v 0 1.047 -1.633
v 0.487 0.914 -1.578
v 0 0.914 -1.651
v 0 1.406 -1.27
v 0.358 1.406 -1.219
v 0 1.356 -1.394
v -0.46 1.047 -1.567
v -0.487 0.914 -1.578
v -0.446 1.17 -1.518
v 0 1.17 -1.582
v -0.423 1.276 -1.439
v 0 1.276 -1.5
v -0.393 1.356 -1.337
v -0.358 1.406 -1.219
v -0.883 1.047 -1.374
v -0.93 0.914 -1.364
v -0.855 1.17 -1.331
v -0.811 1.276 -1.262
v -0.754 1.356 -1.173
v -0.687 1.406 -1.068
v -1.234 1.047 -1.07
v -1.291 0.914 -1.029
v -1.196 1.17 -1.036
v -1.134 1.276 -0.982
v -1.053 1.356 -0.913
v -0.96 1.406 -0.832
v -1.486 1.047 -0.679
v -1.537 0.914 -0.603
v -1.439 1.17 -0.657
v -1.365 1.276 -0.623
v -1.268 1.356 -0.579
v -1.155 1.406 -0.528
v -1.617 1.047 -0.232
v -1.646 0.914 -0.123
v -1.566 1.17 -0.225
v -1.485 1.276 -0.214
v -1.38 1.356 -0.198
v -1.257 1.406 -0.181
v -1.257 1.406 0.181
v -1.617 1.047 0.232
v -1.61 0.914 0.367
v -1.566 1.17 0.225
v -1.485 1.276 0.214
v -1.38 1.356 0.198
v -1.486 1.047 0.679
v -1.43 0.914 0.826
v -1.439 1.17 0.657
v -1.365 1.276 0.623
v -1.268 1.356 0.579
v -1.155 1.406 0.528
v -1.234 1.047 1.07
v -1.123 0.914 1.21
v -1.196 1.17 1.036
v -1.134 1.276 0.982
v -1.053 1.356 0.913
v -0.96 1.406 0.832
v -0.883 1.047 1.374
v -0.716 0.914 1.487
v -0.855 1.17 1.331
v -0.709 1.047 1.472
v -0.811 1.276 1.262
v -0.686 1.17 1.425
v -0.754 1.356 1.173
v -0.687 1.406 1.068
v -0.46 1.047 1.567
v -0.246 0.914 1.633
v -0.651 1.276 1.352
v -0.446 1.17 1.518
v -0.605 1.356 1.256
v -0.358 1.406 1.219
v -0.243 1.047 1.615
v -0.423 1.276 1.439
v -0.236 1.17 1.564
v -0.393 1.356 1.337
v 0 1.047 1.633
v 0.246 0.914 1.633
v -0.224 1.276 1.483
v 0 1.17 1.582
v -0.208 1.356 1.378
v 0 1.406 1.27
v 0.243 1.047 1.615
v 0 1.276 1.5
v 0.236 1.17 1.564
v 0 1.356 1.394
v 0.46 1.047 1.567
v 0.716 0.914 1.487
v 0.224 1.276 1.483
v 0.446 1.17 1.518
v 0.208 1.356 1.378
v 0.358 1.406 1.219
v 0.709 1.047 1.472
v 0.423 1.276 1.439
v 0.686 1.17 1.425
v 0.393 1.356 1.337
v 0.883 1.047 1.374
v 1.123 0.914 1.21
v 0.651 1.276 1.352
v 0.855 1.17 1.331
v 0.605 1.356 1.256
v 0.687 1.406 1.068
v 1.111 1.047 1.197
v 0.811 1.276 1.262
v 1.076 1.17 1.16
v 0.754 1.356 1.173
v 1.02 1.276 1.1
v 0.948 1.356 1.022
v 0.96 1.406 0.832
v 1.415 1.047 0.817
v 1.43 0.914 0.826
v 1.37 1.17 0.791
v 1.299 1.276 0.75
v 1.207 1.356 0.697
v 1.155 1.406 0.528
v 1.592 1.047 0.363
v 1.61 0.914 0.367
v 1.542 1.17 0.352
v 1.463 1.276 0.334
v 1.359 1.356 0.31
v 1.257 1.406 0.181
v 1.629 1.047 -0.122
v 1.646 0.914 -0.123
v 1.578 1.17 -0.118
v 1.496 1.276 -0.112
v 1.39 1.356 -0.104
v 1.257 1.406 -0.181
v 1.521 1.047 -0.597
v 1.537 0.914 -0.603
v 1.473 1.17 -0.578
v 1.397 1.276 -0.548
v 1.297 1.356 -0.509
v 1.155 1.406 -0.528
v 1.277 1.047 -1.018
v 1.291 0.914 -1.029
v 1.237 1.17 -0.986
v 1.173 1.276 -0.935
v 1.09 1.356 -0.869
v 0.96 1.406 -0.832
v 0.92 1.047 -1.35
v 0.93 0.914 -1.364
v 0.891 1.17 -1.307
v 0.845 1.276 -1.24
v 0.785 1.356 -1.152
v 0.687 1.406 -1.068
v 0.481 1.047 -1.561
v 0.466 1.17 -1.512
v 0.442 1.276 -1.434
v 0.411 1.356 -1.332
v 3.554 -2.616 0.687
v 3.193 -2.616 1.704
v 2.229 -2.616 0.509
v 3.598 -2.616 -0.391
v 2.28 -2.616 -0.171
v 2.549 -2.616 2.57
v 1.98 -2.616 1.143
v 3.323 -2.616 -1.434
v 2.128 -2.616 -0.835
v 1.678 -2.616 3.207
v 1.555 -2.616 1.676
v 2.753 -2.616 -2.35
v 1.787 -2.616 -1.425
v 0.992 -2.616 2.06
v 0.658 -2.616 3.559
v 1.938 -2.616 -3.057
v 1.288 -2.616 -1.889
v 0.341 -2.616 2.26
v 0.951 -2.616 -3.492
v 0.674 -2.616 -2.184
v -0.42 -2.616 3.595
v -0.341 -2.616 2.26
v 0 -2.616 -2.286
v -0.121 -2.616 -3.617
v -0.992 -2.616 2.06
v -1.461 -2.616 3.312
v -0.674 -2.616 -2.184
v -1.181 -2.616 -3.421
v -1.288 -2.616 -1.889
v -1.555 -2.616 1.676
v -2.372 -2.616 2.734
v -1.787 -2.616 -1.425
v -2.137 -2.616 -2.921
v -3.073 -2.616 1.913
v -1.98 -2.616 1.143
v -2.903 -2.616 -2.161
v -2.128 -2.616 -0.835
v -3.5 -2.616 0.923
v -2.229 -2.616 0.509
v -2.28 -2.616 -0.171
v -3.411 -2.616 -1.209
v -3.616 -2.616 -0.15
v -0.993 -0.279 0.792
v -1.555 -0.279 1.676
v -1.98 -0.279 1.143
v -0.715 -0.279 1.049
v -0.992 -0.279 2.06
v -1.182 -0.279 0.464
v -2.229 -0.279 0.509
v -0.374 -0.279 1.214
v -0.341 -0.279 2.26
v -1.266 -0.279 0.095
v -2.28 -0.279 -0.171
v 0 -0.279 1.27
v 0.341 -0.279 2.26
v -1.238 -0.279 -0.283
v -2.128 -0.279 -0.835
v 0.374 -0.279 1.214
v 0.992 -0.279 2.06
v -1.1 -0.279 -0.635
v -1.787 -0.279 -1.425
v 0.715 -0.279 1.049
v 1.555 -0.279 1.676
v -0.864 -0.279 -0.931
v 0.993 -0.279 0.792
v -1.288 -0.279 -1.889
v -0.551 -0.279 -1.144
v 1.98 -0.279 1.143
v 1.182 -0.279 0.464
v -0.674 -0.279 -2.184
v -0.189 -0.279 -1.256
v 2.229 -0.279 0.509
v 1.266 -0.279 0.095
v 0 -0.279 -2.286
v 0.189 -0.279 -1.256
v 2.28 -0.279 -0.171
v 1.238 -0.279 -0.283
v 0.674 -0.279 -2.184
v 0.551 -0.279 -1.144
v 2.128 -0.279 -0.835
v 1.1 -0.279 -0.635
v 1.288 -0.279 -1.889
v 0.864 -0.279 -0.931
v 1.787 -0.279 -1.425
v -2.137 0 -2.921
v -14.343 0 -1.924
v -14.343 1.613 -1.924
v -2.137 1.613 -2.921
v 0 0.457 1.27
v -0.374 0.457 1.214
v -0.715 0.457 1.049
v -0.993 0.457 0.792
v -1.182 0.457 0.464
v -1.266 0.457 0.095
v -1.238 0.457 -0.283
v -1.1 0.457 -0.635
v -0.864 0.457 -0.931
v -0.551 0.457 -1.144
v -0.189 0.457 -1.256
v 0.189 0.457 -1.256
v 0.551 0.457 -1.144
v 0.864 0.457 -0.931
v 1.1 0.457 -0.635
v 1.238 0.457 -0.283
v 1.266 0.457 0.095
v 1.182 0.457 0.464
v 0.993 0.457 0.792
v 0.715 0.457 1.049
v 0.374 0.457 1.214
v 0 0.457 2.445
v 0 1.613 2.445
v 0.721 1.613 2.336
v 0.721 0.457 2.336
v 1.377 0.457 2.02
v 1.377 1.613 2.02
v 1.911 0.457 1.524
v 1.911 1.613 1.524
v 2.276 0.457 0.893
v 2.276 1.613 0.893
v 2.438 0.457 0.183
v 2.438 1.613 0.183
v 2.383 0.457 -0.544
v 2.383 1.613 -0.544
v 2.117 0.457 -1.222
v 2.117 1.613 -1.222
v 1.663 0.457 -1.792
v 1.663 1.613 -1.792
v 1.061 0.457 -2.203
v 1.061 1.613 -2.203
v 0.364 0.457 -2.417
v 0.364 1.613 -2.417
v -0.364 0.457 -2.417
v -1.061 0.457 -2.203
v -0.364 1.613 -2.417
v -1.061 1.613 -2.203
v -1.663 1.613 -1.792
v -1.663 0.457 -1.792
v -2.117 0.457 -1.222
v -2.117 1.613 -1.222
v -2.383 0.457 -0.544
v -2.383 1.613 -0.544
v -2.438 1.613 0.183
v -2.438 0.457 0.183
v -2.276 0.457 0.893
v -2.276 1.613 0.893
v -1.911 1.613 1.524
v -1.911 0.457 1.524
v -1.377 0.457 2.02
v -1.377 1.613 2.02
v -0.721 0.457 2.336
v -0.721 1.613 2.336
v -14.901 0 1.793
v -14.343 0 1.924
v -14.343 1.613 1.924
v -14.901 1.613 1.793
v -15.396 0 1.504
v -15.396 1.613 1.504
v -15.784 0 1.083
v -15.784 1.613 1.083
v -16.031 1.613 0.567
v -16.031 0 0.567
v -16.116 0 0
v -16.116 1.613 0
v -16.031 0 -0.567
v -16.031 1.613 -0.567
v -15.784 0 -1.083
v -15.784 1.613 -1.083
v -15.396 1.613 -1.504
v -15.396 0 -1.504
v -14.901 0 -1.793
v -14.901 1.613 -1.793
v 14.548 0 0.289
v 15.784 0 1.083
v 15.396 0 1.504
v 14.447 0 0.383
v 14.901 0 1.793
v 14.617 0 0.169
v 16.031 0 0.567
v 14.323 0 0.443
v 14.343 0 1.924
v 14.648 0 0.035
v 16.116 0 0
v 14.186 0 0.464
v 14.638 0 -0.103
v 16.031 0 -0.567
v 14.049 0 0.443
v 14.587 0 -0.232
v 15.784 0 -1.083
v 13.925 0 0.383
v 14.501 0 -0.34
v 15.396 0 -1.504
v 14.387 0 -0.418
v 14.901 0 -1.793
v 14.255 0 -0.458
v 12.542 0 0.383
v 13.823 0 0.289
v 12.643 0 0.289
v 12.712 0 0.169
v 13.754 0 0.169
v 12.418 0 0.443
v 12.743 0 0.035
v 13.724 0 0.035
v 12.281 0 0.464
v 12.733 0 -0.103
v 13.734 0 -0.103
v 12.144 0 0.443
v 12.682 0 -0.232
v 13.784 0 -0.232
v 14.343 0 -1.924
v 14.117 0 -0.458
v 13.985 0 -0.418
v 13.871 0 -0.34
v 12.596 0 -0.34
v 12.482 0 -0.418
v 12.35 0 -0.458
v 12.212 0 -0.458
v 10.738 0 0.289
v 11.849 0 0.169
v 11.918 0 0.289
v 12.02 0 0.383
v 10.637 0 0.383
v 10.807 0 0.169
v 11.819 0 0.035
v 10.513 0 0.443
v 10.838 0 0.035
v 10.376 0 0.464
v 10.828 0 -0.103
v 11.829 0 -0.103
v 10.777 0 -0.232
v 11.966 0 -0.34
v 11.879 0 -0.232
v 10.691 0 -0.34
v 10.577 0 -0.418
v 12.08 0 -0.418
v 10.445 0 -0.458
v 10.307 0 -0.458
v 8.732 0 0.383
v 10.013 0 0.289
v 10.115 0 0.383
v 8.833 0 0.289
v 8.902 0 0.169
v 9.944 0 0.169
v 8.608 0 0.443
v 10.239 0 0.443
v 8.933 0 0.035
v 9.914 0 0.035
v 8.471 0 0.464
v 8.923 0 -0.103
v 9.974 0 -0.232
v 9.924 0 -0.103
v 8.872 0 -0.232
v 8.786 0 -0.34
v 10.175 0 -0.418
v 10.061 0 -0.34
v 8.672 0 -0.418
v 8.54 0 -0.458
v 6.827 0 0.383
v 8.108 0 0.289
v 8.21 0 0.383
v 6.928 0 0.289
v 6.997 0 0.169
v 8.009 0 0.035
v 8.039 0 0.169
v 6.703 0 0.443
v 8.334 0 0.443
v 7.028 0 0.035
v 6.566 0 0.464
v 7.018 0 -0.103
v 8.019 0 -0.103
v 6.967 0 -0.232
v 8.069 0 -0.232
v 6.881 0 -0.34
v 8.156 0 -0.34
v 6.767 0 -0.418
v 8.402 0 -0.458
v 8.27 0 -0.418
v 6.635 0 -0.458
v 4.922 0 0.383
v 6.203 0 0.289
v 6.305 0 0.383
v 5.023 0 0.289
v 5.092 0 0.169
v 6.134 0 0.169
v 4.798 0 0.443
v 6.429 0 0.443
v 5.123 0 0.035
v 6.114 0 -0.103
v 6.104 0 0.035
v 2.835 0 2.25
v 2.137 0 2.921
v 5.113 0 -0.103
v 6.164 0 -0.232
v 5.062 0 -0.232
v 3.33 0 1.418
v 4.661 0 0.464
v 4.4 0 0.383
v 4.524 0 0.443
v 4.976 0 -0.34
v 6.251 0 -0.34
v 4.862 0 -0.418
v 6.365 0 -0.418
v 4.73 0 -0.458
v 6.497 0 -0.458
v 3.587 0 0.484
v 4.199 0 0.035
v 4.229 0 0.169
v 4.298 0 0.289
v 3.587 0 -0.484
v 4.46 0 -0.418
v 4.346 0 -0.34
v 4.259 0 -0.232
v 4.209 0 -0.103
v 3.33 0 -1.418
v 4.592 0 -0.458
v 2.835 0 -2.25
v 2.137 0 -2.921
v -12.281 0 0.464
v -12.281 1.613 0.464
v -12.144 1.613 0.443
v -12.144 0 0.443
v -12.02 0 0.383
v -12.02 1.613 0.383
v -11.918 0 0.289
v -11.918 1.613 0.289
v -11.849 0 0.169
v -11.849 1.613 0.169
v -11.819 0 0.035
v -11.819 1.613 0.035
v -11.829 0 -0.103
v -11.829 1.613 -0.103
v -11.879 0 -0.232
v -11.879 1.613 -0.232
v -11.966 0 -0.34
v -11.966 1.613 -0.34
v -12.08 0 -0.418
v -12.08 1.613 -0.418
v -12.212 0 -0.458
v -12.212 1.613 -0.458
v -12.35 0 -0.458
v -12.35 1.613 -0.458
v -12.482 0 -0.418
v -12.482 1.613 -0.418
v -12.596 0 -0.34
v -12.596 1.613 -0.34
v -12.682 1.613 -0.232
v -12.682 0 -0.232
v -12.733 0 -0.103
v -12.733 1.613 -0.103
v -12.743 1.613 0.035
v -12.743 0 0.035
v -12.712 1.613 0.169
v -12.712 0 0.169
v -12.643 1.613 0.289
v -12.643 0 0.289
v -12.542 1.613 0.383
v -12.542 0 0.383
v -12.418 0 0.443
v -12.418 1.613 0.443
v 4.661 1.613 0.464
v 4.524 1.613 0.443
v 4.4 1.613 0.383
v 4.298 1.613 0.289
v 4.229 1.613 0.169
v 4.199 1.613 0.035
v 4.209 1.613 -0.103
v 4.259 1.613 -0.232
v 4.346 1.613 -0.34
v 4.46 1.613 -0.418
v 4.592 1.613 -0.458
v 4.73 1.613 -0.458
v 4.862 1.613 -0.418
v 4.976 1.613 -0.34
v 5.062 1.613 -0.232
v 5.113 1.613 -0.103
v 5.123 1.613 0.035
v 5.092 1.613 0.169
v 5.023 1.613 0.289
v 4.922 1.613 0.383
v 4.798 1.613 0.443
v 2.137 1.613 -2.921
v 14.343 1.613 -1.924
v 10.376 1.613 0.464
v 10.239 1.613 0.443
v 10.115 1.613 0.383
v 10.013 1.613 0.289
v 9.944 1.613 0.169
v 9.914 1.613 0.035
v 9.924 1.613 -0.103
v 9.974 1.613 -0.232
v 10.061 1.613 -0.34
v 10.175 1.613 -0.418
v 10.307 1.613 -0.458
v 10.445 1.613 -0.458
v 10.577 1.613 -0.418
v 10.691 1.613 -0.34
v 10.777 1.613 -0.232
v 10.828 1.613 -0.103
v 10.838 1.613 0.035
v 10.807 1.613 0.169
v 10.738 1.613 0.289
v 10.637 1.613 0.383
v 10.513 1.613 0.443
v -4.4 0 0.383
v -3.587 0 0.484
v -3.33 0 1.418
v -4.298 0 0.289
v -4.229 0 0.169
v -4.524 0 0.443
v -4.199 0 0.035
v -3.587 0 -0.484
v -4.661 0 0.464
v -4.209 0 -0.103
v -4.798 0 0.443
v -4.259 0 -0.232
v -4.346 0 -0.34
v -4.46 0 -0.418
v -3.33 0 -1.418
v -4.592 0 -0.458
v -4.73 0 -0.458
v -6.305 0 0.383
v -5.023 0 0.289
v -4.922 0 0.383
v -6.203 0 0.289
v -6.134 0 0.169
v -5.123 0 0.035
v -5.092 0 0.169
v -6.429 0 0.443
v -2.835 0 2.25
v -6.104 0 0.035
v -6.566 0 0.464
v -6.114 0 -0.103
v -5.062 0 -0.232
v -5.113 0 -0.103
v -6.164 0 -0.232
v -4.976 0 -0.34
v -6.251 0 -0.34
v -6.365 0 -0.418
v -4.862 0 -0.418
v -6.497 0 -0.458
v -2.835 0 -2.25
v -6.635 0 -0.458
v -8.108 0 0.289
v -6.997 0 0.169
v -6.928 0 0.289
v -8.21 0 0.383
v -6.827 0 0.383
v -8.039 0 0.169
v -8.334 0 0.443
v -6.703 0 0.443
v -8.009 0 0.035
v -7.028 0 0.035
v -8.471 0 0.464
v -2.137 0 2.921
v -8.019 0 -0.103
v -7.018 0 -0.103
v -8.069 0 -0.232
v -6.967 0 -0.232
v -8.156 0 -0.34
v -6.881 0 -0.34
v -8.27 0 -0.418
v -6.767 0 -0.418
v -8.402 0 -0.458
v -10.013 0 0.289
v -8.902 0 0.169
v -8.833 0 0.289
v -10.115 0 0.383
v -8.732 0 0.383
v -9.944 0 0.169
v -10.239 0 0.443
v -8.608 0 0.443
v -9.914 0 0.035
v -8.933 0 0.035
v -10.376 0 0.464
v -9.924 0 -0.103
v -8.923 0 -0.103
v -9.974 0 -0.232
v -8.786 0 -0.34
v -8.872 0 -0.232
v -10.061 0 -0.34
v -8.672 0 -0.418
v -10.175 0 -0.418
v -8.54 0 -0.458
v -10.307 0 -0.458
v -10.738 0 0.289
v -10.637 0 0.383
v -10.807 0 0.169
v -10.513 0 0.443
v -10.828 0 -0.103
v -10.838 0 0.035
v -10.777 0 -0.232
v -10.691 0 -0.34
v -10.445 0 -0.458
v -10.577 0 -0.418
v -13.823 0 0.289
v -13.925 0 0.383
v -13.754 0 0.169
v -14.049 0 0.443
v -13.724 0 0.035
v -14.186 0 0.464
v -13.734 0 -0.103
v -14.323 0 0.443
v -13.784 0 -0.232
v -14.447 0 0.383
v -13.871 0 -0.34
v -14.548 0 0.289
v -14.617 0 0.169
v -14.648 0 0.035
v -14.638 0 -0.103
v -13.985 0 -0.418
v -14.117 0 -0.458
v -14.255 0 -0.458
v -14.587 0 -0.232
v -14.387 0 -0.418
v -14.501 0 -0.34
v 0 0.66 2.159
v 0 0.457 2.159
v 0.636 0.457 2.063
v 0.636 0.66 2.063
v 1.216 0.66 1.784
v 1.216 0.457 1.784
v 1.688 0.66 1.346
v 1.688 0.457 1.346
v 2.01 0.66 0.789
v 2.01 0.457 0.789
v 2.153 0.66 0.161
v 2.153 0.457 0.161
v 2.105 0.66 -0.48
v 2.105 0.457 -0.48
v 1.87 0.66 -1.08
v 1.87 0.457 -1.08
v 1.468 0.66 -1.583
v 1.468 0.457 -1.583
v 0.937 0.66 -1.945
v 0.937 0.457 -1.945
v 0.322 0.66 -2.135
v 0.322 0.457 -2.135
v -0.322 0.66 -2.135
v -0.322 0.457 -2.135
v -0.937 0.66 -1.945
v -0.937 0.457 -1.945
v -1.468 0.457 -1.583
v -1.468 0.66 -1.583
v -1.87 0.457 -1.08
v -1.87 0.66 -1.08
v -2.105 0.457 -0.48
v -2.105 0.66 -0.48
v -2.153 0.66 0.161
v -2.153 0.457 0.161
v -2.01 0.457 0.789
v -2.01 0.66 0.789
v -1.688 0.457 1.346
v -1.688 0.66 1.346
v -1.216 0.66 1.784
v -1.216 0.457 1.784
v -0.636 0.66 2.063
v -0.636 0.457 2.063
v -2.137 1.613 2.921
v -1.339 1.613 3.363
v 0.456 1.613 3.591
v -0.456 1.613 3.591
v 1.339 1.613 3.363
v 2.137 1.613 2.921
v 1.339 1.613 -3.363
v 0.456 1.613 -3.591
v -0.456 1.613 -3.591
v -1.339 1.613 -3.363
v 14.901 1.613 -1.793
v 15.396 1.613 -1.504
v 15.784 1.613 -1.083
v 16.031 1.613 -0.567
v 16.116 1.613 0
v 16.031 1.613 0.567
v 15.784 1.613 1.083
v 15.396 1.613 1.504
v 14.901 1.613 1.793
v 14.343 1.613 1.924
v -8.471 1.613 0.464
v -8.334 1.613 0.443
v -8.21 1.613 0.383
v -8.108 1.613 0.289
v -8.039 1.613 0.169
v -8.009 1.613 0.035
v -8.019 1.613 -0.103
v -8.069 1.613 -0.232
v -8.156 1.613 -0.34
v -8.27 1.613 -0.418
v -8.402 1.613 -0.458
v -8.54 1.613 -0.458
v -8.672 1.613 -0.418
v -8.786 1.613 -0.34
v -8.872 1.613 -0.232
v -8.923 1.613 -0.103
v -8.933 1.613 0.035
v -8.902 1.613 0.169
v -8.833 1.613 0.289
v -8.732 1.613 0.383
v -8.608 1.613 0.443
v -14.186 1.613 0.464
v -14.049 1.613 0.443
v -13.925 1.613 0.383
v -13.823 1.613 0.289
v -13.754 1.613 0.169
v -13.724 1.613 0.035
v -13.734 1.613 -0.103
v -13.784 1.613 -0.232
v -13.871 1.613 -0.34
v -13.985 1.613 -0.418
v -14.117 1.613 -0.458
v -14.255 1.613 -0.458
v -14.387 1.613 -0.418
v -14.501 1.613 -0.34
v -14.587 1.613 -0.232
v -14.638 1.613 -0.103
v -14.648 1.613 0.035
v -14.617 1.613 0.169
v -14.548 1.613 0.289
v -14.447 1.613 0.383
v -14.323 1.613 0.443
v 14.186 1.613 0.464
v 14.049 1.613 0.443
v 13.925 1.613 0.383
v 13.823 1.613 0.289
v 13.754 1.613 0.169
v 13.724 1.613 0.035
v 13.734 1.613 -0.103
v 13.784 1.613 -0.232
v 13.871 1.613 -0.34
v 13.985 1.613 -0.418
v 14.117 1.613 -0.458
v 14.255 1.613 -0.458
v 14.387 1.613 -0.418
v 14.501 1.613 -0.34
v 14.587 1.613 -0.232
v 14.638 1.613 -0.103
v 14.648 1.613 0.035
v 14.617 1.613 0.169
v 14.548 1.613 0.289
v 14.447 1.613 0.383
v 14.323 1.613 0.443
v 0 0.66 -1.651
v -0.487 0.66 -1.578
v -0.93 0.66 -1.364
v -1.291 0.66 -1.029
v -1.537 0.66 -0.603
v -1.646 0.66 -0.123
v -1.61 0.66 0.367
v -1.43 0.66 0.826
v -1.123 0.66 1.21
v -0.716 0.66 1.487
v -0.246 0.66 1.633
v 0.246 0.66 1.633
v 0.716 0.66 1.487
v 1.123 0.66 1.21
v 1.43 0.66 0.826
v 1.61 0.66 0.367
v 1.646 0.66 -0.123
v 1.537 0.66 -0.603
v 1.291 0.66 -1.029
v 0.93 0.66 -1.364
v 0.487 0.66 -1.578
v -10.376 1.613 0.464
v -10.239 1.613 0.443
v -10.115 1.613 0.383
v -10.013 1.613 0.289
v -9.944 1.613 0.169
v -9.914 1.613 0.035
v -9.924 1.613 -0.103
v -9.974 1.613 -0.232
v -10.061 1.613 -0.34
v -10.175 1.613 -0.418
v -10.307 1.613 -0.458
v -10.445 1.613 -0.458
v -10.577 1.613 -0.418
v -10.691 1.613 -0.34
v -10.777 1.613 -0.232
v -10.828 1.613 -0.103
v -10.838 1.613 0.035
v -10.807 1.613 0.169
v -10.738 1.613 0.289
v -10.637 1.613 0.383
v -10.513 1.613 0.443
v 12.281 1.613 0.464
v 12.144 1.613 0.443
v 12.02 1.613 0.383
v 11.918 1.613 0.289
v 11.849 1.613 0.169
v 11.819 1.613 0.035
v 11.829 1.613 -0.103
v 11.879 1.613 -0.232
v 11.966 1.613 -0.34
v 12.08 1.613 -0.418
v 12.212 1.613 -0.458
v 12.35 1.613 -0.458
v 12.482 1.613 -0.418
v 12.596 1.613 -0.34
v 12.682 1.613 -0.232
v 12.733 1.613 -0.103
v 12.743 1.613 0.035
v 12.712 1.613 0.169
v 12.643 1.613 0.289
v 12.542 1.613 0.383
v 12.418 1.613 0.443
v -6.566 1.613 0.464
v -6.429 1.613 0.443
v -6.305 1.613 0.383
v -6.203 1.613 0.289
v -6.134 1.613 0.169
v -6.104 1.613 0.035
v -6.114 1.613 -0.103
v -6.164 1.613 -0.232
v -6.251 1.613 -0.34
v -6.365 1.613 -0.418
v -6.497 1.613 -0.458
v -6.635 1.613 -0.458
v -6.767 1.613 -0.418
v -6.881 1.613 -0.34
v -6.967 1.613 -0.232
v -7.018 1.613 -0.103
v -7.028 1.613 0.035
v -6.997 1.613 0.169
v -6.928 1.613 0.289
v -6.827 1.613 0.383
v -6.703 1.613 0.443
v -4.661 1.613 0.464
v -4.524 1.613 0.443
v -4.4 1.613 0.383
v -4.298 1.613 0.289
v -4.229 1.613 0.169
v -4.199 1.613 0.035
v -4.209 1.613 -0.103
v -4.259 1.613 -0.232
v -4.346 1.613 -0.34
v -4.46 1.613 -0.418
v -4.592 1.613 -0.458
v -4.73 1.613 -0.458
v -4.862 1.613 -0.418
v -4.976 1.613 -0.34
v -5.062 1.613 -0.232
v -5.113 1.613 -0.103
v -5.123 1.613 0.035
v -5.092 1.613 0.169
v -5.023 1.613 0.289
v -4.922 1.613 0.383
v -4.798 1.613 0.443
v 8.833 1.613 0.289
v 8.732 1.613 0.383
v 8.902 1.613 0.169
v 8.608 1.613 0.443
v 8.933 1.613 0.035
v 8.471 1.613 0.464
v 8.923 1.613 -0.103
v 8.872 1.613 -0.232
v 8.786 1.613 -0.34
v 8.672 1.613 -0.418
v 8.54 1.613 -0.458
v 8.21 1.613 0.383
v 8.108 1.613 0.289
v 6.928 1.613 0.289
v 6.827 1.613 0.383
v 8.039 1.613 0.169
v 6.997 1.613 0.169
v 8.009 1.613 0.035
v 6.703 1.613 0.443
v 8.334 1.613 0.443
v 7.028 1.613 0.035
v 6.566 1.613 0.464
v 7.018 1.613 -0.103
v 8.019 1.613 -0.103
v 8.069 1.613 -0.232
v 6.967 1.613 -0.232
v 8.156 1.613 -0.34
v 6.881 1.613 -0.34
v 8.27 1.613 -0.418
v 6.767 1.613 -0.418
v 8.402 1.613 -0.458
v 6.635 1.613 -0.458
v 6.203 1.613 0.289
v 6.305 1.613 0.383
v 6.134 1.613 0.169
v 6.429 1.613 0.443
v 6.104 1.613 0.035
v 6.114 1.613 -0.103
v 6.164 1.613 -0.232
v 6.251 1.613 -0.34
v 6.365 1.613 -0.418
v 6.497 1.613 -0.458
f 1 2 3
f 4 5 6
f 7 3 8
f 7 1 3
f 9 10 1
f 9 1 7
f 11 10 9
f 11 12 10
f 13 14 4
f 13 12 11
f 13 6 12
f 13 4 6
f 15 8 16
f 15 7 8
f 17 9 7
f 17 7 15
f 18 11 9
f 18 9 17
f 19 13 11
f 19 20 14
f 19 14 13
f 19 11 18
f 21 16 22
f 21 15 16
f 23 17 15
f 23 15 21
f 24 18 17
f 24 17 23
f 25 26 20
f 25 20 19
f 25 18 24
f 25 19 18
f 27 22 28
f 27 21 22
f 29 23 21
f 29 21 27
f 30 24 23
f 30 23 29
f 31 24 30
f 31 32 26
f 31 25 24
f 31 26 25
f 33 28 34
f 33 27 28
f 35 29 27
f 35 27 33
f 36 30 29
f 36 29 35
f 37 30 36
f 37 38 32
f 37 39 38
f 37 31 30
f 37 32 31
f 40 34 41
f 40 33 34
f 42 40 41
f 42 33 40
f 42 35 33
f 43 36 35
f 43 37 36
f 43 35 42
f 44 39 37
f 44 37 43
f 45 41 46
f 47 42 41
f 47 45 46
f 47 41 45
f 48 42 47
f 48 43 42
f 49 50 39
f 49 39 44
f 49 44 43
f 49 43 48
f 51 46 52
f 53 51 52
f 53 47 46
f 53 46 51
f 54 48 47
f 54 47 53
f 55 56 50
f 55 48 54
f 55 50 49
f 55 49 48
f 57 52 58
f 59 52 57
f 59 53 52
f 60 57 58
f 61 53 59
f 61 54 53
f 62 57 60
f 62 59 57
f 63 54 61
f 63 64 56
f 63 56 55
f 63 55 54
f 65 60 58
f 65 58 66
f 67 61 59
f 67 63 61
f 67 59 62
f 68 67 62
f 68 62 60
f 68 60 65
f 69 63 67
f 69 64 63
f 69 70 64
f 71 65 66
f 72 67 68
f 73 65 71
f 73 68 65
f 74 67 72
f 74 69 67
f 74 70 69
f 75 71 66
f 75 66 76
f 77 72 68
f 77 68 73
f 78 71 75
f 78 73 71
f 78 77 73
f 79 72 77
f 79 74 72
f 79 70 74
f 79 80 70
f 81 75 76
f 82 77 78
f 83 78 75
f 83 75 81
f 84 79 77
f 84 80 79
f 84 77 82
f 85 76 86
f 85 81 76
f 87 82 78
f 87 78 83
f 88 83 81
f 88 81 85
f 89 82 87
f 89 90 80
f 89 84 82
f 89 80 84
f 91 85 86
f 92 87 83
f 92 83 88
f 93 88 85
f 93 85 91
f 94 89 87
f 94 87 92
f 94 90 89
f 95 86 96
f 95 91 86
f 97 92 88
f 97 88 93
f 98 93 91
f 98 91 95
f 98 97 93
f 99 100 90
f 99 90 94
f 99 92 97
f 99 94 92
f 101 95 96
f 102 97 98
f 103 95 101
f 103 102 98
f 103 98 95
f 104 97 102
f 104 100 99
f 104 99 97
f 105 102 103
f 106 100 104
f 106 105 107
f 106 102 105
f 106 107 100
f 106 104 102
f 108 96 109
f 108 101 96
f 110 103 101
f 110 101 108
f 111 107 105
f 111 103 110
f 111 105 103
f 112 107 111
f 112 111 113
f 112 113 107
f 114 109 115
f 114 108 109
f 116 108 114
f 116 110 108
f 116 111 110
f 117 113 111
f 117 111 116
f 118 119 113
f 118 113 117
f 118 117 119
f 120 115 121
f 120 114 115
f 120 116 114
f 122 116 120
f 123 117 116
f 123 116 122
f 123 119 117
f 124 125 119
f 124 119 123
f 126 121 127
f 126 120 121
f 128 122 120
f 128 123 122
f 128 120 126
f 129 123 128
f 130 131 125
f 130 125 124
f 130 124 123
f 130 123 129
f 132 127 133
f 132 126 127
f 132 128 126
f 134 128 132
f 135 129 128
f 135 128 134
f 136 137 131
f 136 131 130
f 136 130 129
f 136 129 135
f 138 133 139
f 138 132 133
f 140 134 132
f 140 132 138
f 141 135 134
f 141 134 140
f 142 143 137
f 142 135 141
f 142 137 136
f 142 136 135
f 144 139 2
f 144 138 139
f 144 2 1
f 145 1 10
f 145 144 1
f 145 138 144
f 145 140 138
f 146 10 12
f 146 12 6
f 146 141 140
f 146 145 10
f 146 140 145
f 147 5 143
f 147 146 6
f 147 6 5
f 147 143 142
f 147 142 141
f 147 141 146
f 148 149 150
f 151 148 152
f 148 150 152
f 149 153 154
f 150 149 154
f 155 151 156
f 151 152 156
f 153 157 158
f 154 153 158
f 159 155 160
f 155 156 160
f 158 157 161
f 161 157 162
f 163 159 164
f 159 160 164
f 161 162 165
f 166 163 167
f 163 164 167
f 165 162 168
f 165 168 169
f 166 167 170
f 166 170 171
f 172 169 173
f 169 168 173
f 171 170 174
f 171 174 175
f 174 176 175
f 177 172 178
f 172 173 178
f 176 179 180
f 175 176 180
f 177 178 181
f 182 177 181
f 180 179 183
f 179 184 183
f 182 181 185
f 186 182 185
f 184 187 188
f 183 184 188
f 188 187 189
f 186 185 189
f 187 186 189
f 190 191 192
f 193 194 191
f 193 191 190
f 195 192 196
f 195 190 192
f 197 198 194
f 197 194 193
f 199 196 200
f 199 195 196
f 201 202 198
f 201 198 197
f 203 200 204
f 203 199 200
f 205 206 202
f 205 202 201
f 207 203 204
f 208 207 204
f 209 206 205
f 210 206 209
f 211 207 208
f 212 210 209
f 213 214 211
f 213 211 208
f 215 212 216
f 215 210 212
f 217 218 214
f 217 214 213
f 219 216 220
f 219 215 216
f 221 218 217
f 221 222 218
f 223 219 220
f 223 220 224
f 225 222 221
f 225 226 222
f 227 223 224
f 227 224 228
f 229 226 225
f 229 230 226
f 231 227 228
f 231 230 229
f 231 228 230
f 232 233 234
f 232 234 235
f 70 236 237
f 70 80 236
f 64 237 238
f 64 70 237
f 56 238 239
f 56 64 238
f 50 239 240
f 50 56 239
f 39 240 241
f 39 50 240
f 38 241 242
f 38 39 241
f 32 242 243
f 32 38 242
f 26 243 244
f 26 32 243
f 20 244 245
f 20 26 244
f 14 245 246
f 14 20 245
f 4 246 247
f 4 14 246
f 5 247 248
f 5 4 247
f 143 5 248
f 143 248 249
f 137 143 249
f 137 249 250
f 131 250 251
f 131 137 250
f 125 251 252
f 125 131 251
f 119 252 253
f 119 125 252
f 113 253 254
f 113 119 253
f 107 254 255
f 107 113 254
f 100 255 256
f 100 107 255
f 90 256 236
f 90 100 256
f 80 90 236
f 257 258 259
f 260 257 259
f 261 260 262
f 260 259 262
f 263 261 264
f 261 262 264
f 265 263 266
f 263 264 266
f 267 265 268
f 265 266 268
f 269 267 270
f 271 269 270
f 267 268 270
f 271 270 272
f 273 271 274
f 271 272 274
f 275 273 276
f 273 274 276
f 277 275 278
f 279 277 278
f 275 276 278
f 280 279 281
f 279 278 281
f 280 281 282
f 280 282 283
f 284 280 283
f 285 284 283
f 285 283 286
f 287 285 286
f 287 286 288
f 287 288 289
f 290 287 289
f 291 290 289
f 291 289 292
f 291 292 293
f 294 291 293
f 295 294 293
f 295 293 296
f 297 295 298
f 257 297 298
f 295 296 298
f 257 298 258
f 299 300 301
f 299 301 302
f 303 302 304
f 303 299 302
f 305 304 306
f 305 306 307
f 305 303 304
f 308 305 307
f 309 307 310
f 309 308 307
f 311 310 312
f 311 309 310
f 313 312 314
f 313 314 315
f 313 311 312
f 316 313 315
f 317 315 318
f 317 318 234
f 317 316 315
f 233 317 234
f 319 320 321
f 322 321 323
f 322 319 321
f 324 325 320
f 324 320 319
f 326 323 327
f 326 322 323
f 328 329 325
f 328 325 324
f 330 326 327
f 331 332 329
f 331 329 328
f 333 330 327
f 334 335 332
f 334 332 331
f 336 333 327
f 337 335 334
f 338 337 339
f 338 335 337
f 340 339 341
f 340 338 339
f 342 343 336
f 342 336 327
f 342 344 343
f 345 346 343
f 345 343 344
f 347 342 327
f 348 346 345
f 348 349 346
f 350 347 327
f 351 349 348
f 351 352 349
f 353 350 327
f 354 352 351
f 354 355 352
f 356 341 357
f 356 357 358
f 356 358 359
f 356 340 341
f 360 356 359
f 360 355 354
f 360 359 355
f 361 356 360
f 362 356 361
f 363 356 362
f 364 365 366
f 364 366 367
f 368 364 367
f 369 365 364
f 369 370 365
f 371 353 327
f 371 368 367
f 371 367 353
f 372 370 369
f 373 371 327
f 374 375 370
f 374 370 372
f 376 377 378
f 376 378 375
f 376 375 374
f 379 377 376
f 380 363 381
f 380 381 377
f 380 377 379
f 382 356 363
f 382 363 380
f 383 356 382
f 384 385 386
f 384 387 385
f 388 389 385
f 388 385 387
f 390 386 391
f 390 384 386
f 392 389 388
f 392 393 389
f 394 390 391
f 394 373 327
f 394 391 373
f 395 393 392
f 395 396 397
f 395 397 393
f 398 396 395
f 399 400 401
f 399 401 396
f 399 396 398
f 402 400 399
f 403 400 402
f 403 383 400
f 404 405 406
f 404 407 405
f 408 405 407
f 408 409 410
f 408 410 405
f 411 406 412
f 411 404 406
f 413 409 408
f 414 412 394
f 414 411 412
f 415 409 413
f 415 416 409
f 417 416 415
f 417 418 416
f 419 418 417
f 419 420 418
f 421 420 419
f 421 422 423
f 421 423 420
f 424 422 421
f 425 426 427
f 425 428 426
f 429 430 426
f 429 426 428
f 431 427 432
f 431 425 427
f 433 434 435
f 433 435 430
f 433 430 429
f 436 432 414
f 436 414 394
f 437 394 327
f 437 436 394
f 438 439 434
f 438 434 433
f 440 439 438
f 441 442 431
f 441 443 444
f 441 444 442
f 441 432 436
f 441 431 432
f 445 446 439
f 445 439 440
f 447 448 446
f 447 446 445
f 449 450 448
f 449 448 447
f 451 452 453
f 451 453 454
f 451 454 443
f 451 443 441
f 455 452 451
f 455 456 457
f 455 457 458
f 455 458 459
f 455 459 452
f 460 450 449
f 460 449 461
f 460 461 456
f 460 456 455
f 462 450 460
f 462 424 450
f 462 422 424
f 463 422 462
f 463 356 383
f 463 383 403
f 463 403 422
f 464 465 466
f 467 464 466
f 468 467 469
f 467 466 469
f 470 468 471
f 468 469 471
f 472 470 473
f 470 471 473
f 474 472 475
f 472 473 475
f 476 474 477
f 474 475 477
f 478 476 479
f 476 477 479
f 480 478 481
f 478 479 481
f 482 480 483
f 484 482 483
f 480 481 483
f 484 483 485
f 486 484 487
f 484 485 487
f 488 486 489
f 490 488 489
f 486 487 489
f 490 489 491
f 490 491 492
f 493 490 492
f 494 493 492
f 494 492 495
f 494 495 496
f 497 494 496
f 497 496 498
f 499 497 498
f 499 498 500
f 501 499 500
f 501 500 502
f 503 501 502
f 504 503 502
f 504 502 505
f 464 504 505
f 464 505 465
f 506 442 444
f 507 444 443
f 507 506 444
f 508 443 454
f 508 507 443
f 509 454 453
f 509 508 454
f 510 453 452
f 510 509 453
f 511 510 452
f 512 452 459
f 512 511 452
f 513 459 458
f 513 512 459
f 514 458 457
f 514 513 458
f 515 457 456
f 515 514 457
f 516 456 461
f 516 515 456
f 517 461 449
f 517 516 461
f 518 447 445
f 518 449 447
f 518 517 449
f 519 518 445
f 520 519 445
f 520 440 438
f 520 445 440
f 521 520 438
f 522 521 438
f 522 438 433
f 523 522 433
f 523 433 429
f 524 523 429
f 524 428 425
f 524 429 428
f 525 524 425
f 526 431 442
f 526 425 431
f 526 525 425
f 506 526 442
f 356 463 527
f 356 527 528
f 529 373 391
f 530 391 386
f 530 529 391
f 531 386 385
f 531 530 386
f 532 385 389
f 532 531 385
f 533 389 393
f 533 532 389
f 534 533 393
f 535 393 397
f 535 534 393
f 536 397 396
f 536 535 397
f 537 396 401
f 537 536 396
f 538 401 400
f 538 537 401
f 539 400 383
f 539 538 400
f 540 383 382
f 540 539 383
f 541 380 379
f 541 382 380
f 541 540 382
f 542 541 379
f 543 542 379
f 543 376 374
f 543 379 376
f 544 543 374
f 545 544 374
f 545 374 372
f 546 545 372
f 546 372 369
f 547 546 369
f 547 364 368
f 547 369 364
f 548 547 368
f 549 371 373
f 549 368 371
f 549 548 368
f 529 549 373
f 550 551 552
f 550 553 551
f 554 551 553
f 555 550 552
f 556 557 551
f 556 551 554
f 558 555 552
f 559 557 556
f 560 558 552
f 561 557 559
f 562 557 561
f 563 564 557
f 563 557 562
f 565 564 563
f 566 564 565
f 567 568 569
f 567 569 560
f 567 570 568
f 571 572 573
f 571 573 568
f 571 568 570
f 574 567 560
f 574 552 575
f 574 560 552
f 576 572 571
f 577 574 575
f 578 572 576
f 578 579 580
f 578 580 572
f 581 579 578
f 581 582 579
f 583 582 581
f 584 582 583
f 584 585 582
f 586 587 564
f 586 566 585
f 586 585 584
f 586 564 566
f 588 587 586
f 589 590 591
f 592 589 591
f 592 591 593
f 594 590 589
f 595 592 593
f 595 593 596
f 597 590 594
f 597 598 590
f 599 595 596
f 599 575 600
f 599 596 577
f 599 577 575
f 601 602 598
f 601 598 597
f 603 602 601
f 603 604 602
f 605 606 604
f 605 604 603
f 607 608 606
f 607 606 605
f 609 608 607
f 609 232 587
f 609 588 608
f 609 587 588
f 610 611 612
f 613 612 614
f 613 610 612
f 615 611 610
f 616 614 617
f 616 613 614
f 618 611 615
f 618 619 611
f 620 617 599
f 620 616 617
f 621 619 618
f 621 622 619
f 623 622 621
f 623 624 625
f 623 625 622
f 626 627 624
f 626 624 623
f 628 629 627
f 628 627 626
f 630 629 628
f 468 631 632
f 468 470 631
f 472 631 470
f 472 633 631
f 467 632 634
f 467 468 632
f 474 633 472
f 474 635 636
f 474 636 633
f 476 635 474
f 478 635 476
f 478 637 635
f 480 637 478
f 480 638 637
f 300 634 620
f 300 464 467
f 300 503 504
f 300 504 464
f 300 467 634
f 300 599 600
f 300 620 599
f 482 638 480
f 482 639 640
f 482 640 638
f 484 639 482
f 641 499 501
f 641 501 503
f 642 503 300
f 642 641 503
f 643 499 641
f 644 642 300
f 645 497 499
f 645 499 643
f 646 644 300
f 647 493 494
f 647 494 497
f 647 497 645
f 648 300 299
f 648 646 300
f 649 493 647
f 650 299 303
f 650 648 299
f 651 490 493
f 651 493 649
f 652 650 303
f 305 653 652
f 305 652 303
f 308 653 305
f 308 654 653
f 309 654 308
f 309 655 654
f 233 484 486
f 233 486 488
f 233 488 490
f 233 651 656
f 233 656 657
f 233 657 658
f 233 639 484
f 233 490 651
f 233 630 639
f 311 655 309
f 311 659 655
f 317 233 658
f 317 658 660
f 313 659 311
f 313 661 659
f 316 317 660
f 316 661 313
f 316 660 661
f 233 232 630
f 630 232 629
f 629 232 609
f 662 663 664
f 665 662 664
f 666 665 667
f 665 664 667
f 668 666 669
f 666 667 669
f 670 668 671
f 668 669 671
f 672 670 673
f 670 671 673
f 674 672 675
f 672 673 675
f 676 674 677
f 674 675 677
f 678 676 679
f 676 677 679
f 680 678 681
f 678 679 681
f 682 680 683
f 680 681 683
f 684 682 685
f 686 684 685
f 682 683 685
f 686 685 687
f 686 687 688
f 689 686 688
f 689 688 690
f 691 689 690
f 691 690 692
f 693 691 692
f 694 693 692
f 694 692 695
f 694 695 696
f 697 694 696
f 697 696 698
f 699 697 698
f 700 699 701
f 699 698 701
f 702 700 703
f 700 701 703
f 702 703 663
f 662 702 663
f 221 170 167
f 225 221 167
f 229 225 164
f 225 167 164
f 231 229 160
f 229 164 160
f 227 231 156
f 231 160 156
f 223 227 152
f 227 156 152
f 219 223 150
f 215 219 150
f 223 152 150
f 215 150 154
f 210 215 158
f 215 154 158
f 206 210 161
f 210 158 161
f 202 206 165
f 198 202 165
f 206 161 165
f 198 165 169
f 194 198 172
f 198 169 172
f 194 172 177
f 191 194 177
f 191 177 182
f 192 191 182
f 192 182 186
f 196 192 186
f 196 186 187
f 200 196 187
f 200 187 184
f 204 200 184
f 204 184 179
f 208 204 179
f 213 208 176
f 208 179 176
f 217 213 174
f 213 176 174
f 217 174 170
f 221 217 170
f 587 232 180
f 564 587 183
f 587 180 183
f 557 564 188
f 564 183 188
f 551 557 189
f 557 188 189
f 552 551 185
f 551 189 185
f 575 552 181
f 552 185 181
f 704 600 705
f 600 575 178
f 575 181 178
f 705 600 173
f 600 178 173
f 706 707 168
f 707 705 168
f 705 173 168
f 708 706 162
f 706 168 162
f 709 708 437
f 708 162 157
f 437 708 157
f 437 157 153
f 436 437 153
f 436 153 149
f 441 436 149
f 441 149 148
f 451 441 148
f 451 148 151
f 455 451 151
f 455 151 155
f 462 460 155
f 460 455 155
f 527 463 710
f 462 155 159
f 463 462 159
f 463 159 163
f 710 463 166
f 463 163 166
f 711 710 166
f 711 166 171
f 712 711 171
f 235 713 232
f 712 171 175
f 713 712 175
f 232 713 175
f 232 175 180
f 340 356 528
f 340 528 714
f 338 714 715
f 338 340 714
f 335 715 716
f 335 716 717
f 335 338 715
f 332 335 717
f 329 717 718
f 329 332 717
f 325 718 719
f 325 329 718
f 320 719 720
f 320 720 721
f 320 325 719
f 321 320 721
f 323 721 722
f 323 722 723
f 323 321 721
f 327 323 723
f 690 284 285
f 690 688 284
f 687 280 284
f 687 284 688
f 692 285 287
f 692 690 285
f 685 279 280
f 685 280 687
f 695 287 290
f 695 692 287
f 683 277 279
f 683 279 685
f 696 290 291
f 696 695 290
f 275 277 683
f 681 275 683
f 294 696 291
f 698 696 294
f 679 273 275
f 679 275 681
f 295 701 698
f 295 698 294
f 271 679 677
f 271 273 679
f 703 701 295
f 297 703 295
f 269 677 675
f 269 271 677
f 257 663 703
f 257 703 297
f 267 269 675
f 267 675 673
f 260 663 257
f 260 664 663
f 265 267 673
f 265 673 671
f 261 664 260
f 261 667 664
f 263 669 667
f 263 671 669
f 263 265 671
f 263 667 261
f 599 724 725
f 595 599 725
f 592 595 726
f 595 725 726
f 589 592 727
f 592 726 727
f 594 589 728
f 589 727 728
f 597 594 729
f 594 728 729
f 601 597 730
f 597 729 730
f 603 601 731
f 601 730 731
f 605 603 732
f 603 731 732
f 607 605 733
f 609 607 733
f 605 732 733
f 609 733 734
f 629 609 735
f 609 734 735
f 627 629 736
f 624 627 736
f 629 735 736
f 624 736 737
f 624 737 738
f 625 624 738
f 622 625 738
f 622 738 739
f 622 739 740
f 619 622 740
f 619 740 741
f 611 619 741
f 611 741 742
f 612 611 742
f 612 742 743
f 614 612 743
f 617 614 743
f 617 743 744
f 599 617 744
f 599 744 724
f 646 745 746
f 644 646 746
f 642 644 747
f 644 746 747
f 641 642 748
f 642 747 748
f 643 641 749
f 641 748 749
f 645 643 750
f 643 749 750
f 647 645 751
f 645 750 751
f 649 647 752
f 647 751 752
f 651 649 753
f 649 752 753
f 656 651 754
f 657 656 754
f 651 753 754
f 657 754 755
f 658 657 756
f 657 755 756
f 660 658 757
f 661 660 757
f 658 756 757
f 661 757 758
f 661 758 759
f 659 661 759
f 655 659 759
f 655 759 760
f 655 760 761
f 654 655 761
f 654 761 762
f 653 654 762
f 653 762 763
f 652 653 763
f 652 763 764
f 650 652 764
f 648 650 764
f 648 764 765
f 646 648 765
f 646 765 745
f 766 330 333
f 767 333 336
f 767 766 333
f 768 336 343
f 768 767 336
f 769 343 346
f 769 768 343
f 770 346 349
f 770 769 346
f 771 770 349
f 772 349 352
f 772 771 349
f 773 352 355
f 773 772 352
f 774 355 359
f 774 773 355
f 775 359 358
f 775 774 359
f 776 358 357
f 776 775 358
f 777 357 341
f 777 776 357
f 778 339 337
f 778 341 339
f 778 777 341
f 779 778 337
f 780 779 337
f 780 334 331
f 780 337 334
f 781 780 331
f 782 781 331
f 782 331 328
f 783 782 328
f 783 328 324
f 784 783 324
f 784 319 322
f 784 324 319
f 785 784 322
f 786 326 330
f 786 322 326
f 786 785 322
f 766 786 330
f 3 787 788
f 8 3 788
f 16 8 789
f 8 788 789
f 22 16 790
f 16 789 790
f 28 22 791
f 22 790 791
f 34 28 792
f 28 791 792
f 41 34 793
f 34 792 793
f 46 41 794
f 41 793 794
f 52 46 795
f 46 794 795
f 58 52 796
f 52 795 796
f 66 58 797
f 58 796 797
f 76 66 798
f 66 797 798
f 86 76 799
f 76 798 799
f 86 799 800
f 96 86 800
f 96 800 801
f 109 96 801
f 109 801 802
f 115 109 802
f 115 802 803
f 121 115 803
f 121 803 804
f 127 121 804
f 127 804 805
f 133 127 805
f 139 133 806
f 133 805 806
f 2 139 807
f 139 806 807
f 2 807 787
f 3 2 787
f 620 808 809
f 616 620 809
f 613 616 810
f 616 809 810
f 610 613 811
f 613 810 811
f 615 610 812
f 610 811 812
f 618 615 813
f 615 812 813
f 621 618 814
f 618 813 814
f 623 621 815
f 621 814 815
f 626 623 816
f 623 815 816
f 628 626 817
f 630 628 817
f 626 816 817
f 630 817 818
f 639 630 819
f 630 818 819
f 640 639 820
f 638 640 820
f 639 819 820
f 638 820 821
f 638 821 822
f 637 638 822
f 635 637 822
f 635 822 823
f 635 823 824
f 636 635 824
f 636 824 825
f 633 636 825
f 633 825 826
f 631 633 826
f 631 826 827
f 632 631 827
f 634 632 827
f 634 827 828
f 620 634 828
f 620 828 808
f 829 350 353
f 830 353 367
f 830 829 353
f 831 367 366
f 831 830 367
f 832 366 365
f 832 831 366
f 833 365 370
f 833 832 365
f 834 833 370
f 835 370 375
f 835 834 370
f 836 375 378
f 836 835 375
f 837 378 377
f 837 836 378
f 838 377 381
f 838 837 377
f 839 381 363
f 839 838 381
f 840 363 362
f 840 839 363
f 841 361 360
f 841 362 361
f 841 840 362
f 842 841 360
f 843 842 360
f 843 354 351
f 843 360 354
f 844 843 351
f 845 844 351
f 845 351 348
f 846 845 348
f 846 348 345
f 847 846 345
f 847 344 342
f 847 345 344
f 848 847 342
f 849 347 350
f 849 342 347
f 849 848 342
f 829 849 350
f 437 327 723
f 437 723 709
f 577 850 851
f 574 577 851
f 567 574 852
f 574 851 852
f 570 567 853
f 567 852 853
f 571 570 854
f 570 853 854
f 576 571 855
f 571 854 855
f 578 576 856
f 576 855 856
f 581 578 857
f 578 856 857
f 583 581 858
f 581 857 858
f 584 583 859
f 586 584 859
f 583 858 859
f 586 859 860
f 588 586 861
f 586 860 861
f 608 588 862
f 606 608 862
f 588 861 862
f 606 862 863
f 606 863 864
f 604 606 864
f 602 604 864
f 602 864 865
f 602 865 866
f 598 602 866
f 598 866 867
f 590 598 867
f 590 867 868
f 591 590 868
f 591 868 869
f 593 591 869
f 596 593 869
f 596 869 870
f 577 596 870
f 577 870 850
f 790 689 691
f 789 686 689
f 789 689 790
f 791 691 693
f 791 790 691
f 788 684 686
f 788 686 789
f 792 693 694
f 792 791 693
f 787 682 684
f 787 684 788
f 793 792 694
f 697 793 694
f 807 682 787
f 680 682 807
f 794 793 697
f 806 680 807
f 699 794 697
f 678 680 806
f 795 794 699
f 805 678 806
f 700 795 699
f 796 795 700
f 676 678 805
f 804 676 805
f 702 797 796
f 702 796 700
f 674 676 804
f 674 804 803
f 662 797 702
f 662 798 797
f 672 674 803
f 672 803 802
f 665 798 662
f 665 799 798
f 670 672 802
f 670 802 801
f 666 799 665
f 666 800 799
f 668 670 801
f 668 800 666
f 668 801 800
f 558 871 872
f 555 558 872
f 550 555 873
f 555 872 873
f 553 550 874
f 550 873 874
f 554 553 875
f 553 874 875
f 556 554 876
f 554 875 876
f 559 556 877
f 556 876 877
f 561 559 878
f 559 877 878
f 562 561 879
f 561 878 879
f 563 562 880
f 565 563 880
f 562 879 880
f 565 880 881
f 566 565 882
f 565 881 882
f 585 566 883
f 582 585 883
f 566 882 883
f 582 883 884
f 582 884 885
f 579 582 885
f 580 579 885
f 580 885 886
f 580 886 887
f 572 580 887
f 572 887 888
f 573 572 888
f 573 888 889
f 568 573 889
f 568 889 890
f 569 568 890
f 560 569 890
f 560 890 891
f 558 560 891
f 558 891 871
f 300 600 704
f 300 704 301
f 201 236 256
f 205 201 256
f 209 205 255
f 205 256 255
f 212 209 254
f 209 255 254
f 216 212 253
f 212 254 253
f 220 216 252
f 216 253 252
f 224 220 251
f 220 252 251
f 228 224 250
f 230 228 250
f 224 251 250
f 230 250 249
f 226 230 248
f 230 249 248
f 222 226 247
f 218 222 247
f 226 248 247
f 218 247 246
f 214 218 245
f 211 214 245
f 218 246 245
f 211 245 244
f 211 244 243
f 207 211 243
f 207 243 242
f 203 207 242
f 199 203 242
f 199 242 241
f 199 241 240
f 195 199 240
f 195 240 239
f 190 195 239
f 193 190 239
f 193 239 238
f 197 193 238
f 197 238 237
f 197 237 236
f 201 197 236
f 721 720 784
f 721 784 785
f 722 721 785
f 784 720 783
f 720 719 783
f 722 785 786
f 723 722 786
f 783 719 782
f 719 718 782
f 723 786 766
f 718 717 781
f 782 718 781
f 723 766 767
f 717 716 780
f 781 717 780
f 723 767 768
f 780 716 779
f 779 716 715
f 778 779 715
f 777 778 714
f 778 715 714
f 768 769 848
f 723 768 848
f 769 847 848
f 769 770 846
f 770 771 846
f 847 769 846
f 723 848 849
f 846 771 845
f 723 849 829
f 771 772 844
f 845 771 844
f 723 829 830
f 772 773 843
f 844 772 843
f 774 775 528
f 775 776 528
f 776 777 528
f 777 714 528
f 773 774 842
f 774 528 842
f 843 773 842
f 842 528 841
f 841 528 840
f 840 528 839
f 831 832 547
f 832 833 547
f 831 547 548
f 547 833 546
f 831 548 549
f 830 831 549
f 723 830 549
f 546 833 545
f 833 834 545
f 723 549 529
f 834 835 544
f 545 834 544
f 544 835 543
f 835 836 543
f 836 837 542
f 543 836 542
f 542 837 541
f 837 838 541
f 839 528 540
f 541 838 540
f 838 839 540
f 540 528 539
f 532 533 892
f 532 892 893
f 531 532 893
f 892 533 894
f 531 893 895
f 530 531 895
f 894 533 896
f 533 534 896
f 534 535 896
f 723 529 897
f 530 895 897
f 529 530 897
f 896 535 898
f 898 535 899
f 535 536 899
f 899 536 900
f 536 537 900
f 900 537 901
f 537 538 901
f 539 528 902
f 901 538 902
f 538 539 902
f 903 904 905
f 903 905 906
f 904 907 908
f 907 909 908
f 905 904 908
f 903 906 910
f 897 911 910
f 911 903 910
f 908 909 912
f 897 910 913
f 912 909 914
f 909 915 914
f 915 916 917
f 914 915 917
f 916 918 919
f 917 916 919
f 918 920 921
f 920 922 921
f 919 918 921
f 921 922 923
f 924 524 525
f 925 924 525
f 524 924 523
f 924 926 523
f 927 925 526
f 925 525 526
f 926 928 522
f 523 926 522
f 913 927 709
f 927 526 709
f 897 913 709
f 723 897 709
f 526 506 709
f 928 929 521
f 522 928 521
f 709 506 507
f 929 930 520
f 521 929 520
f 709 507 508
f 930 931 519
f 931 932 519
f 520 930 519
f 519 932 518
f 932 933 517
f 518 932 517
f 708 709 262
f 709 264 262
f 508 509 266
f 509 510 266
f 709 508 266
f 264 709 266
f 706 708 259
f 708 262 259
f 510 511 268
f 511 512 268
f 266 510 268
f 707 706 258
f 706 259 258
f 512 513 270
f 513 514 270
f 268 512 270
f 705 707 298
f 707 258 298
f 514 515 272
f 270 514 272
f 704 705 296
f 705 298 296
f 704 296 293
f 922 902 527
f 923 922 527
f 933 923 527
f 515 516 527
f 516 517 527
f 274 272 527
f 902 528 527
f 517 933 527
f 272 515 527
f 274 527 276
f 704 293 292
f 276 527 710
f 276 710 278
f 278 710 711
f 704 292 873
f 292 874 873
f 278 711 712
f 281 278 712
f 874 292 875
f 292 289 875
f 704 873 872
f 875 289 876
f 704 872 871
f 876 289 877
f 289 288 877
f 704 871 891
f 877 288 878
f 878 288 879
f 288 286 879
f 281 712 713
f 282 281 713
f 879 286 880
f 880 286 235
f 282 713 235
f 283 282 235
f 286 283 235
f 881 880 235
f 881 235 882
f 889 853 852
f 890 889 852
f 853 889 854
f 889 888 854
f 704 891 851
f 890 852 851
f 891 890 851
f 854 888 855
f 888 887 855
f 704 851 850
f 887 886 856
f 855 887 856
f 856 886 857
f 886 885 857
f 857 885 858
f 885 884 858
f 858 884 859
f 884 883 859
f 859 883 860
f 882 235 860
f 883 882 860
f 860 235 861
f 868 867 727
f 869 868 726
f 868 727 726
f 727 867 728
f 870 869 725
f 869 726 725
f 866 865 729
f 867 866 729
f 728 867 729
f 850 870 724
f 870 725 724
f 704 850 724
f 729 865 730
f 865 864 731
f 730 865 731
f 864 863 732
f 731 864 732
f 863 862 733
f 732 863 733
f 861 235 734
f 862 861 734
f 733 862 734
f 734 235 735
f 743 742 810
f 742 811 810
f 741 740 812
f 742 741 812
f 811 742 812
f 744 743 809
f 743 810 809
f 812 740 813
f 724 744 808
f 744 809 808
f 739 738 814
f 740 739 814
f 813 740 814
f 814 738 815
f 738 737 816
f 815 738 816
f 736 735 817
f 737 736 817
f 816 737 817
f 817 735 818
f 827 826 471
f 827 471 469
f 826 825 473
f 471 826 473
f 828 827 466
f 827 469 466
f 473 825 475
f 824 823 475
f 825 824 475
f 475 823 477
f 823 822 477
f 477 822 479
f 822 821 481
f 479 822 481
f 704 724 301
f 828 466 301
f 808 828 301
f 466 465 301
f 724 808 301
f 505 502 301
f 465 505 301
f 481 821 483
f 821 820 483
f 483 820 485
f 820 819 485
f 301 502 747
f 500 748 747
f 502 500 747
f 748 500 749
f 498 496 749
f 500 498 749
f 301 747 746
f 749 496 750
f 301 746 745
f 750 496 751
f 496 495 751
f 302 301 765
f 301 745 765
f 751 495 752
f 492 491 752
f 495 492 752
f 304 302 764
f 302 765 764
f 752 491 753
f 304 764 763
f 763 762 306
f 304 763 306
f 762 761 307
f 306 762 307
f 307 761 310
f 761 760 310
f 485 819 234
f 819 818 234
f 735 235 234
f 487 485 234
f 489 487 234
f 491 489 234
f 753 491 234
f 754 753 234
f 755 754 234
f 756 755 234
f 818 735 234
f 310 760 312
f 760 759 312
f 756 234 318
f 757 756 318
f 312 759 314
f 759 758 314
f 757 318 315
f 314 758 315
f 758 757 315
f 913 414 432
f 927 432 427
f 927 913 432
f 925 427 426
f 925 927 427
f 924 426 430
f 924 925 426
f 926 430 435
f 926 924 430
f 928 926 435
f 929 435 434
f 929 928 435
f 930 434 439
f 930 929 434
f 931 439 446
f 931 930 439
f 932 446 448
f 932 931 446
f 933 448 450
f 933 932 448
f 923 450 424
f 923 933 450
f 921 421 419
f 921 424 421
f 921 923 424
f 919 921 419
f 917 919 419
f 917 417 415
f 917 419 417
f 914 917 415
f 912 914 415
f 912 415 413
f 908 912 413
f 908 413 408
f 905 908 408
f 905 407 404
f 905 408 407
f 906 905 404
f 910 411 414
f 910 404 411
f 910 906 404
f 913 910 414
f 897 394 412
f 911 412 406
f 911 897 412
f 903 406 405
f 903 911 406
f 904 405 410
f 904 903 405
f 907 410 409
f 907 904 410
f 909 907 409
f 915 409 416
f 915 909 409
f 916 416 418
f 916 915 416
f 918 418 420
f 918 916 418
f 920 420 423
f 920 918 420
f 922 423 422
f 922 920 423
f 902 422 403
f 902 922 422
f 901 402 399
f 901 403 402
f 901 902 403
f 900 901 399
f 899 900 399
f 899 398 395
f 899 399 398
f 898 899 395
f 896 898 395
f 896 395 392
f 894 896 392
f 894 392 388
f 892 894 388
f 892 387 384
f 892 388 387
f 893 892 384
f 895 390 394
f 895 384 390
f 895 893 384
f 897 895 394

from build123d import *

# Parameters (mm, degrees)
EXTRUDE17_DEPTH = 1.6129
EXTRUDE19_START = -4.2291
SKETCH19_R      = 3.6195
EXTRUDE19_DEPTH = 4.2291
SKETCH20_R      = 0.46355
SKETCH20_R_2    = 1.27
EXTRUDE20_DEPTH = 18.050548166
SKETCH21_R      = 2.44475
EXTRUDE21_DEPTH = 1.1557
SKETCH22_R      = 2.286
EXTRUDE22_DEPTH = 2.3368
SKETCH23_R      = 2.159
EXTRUDE23_DEPTH = 0.2032
SKETCH24_R      = 1.651
EXTRUDE24_DEPTH = 0.762
EXTRUDE25_DEPTH = 0.508
FILLET1_R       = 0.508


with BuildPart() as part:
    # Sketch18 → Extrude17 (new body)
    with BuildSketch(Plane(origin=(0, 0, 0), x_dir=(1, 0, 0), z_dir=(0, 1, 0))):
        with BuildLine():
            Line((-14.34305969, 1.923991942), (-2.13741415, 2.921))
            ThreePointArc((-2.13741415, 2.921), (0, 3.6195), (2.13741415, 2.921))
            Line((2.13741415, 2.921), (14.34305969, 1.923991942))
            ThreePointArc((14.34305969, 1.923991942), (16.1163, 0), (14.34305969, -1.923991942))
            Line((14.34305969, -1.923991942), (2.13741415, -2.921))
            ThreePointArc((2.13741415, -2.921), (0, -3.6195), (-2.13741415, -2.921))
            Line((-2.13741415, -2.921), (-14.34305969, -1.923991942))
            ThreePointArc((-14.34305969, -1.923991942), (-16.1163, 0), (-14.34305969, 1.923991942))
        make_face()
    extrude(amount=EXTRUDE17_DEPTH)

    # Sketch19 → Extrude19 (add)
    with BuildSketch(Plane(origin=(0, 1.6129, 0), x_dir=(1, 0, 0), z_dir=(0, 1, 0)).offset(EXTRUDE19_START)):
        with Locations(Location((0, 0, 0), (0, 0, 126.194447475))):
            Circle(SKETCH19_R)
    extrude(amount=EXTRUDE19_DEPTH)

    # Sketch20 → Extrude20 (cut, through all)
    with BuildSketch(Plane(origin=(0, 1.6129, 0), x_dir=(1, 0, 0), z_dir=(0, 1, 0))):
        with Locations(Location((-14.1859, 0, 0), (0, 0, 270))):
            Circle(SKETCH20_R)
        with Locations(Location((0, 0, 0), (0, 0, 270))):
            Circle(SKETCH20_R_2)
        with Locations(Location((-4.6609, 0, 0), (0, 0, 270))):
            Circle(SKETCH20_R)
        with Locations(Location((-6.5659, 0, 0), (0, 0, 270))):
            Circle(SKETCH20_R)
        with Locations(Location((-8.4709, 0, 0), (0, 0, 270))):
            Circle(SKETCH20_R)
        with Locations(Location((-10.3759, 0, 0), (0, 0, 270))):
            Circle(SKETCH20_R)
        with Locations(Location((-12.2809, 0, 0), (0, 0, 270))):
            Circle(SKETCH20_R)
    extrude20 = extrude(amount=-EXTRUDE20_DEPTH, mode=Mode.SUBTRACT)

    # Sketch21 → Extrude21 (cut)
    with BuildSketch(Plane(origin=(0, 1.6129, 0), x_dir=(1, 0, 0), z_dir=(0, 1, 0))):
        with Locations(Location((0, 0, 0), (0, 0, 270))):
            Circle(SKETCH21_R)
    extrude(amount=-EXTRUDE21_DEPTH, mode=Mode.SUBTRACT)

    # Sketch22 → Extrude22 (cut)
    with BuildSketch(Plane.XZ.offset(2.6162)):
        with Locations(Location((0, 0, 0), (0, 0, 270))):
            Circle(SKETCH22_R)
    extrude(amount=-EXTRUDE22_DEPTH, mode=Mode.SUBTRACT)



with BuildPart() as body_2:
    # Sketch23 → Extrude23 (new body)
    with BuildSketch(Plane(origin=(0, 0.4572, 0), x_dir=(1, 0, 0), z_dir=(0, 1, 0))):
        with Locations(Location((0, 0, 0), (0, 0, 270))):
            Circle(SKETCH23_R)
    extrude(amount=EXTRUDE23_DEPTH)


with BuildPart() as part_1:
    add(part.part)

    add(body_2.part)  # Extrude24 merges body 2
    # Sketch24 → Extrude24 (add)
    with BuildSketch(Plane(origin=(0, 0.6604, 0), x_dir=(1, 0, 0), z_dir=(0, 1, 0))):
        with Locations(Location((0, 0, 0), (0, 0, 90))):
            Circle(SKETCH24_R)
    extrude(amount=EXTRUDE24_DEPTH)

    # Sketch25 → Extrude25 (cut)
    with BuildSketch(Plane(origin=(0, 1.4224, 0), x_dir=(1, 0, 0), z_dir=(0, 1, 0))):
        Polygon((0.254, -1.016), (-0.254, -1.016), (-0.254, -0.254), (-1.016, -0.254), (-1.016, 0.254), (-0.254, 0.254), (-0.254, 1.016), (0.254, 1.016), (0.254, 0.254), (1.016, 0.254), (1.016, -0.254), (0.254, -0.254), align=None)
    extrude(amount=-EXTRUDE25_DEPTH, mode=Mode.SUBTRACT)

    # Fillet1
    fillet1_edges = [part_1.edges().sort_by_distance(p)[0] for p in [
        (0, 1.4224, 1.651),
    ]]
    fillet(fillet1_edges, radius=FILLET1_R)

    # Mirror1: Extrude20 across plane
    add(extrude20.mirror(Plane(origin=(0, 0, 0), x_dir=(0, 0, 1), z_dir=(1, 0, 0))), mode=Mode.SUBTRACT)


solid = part_1.part
